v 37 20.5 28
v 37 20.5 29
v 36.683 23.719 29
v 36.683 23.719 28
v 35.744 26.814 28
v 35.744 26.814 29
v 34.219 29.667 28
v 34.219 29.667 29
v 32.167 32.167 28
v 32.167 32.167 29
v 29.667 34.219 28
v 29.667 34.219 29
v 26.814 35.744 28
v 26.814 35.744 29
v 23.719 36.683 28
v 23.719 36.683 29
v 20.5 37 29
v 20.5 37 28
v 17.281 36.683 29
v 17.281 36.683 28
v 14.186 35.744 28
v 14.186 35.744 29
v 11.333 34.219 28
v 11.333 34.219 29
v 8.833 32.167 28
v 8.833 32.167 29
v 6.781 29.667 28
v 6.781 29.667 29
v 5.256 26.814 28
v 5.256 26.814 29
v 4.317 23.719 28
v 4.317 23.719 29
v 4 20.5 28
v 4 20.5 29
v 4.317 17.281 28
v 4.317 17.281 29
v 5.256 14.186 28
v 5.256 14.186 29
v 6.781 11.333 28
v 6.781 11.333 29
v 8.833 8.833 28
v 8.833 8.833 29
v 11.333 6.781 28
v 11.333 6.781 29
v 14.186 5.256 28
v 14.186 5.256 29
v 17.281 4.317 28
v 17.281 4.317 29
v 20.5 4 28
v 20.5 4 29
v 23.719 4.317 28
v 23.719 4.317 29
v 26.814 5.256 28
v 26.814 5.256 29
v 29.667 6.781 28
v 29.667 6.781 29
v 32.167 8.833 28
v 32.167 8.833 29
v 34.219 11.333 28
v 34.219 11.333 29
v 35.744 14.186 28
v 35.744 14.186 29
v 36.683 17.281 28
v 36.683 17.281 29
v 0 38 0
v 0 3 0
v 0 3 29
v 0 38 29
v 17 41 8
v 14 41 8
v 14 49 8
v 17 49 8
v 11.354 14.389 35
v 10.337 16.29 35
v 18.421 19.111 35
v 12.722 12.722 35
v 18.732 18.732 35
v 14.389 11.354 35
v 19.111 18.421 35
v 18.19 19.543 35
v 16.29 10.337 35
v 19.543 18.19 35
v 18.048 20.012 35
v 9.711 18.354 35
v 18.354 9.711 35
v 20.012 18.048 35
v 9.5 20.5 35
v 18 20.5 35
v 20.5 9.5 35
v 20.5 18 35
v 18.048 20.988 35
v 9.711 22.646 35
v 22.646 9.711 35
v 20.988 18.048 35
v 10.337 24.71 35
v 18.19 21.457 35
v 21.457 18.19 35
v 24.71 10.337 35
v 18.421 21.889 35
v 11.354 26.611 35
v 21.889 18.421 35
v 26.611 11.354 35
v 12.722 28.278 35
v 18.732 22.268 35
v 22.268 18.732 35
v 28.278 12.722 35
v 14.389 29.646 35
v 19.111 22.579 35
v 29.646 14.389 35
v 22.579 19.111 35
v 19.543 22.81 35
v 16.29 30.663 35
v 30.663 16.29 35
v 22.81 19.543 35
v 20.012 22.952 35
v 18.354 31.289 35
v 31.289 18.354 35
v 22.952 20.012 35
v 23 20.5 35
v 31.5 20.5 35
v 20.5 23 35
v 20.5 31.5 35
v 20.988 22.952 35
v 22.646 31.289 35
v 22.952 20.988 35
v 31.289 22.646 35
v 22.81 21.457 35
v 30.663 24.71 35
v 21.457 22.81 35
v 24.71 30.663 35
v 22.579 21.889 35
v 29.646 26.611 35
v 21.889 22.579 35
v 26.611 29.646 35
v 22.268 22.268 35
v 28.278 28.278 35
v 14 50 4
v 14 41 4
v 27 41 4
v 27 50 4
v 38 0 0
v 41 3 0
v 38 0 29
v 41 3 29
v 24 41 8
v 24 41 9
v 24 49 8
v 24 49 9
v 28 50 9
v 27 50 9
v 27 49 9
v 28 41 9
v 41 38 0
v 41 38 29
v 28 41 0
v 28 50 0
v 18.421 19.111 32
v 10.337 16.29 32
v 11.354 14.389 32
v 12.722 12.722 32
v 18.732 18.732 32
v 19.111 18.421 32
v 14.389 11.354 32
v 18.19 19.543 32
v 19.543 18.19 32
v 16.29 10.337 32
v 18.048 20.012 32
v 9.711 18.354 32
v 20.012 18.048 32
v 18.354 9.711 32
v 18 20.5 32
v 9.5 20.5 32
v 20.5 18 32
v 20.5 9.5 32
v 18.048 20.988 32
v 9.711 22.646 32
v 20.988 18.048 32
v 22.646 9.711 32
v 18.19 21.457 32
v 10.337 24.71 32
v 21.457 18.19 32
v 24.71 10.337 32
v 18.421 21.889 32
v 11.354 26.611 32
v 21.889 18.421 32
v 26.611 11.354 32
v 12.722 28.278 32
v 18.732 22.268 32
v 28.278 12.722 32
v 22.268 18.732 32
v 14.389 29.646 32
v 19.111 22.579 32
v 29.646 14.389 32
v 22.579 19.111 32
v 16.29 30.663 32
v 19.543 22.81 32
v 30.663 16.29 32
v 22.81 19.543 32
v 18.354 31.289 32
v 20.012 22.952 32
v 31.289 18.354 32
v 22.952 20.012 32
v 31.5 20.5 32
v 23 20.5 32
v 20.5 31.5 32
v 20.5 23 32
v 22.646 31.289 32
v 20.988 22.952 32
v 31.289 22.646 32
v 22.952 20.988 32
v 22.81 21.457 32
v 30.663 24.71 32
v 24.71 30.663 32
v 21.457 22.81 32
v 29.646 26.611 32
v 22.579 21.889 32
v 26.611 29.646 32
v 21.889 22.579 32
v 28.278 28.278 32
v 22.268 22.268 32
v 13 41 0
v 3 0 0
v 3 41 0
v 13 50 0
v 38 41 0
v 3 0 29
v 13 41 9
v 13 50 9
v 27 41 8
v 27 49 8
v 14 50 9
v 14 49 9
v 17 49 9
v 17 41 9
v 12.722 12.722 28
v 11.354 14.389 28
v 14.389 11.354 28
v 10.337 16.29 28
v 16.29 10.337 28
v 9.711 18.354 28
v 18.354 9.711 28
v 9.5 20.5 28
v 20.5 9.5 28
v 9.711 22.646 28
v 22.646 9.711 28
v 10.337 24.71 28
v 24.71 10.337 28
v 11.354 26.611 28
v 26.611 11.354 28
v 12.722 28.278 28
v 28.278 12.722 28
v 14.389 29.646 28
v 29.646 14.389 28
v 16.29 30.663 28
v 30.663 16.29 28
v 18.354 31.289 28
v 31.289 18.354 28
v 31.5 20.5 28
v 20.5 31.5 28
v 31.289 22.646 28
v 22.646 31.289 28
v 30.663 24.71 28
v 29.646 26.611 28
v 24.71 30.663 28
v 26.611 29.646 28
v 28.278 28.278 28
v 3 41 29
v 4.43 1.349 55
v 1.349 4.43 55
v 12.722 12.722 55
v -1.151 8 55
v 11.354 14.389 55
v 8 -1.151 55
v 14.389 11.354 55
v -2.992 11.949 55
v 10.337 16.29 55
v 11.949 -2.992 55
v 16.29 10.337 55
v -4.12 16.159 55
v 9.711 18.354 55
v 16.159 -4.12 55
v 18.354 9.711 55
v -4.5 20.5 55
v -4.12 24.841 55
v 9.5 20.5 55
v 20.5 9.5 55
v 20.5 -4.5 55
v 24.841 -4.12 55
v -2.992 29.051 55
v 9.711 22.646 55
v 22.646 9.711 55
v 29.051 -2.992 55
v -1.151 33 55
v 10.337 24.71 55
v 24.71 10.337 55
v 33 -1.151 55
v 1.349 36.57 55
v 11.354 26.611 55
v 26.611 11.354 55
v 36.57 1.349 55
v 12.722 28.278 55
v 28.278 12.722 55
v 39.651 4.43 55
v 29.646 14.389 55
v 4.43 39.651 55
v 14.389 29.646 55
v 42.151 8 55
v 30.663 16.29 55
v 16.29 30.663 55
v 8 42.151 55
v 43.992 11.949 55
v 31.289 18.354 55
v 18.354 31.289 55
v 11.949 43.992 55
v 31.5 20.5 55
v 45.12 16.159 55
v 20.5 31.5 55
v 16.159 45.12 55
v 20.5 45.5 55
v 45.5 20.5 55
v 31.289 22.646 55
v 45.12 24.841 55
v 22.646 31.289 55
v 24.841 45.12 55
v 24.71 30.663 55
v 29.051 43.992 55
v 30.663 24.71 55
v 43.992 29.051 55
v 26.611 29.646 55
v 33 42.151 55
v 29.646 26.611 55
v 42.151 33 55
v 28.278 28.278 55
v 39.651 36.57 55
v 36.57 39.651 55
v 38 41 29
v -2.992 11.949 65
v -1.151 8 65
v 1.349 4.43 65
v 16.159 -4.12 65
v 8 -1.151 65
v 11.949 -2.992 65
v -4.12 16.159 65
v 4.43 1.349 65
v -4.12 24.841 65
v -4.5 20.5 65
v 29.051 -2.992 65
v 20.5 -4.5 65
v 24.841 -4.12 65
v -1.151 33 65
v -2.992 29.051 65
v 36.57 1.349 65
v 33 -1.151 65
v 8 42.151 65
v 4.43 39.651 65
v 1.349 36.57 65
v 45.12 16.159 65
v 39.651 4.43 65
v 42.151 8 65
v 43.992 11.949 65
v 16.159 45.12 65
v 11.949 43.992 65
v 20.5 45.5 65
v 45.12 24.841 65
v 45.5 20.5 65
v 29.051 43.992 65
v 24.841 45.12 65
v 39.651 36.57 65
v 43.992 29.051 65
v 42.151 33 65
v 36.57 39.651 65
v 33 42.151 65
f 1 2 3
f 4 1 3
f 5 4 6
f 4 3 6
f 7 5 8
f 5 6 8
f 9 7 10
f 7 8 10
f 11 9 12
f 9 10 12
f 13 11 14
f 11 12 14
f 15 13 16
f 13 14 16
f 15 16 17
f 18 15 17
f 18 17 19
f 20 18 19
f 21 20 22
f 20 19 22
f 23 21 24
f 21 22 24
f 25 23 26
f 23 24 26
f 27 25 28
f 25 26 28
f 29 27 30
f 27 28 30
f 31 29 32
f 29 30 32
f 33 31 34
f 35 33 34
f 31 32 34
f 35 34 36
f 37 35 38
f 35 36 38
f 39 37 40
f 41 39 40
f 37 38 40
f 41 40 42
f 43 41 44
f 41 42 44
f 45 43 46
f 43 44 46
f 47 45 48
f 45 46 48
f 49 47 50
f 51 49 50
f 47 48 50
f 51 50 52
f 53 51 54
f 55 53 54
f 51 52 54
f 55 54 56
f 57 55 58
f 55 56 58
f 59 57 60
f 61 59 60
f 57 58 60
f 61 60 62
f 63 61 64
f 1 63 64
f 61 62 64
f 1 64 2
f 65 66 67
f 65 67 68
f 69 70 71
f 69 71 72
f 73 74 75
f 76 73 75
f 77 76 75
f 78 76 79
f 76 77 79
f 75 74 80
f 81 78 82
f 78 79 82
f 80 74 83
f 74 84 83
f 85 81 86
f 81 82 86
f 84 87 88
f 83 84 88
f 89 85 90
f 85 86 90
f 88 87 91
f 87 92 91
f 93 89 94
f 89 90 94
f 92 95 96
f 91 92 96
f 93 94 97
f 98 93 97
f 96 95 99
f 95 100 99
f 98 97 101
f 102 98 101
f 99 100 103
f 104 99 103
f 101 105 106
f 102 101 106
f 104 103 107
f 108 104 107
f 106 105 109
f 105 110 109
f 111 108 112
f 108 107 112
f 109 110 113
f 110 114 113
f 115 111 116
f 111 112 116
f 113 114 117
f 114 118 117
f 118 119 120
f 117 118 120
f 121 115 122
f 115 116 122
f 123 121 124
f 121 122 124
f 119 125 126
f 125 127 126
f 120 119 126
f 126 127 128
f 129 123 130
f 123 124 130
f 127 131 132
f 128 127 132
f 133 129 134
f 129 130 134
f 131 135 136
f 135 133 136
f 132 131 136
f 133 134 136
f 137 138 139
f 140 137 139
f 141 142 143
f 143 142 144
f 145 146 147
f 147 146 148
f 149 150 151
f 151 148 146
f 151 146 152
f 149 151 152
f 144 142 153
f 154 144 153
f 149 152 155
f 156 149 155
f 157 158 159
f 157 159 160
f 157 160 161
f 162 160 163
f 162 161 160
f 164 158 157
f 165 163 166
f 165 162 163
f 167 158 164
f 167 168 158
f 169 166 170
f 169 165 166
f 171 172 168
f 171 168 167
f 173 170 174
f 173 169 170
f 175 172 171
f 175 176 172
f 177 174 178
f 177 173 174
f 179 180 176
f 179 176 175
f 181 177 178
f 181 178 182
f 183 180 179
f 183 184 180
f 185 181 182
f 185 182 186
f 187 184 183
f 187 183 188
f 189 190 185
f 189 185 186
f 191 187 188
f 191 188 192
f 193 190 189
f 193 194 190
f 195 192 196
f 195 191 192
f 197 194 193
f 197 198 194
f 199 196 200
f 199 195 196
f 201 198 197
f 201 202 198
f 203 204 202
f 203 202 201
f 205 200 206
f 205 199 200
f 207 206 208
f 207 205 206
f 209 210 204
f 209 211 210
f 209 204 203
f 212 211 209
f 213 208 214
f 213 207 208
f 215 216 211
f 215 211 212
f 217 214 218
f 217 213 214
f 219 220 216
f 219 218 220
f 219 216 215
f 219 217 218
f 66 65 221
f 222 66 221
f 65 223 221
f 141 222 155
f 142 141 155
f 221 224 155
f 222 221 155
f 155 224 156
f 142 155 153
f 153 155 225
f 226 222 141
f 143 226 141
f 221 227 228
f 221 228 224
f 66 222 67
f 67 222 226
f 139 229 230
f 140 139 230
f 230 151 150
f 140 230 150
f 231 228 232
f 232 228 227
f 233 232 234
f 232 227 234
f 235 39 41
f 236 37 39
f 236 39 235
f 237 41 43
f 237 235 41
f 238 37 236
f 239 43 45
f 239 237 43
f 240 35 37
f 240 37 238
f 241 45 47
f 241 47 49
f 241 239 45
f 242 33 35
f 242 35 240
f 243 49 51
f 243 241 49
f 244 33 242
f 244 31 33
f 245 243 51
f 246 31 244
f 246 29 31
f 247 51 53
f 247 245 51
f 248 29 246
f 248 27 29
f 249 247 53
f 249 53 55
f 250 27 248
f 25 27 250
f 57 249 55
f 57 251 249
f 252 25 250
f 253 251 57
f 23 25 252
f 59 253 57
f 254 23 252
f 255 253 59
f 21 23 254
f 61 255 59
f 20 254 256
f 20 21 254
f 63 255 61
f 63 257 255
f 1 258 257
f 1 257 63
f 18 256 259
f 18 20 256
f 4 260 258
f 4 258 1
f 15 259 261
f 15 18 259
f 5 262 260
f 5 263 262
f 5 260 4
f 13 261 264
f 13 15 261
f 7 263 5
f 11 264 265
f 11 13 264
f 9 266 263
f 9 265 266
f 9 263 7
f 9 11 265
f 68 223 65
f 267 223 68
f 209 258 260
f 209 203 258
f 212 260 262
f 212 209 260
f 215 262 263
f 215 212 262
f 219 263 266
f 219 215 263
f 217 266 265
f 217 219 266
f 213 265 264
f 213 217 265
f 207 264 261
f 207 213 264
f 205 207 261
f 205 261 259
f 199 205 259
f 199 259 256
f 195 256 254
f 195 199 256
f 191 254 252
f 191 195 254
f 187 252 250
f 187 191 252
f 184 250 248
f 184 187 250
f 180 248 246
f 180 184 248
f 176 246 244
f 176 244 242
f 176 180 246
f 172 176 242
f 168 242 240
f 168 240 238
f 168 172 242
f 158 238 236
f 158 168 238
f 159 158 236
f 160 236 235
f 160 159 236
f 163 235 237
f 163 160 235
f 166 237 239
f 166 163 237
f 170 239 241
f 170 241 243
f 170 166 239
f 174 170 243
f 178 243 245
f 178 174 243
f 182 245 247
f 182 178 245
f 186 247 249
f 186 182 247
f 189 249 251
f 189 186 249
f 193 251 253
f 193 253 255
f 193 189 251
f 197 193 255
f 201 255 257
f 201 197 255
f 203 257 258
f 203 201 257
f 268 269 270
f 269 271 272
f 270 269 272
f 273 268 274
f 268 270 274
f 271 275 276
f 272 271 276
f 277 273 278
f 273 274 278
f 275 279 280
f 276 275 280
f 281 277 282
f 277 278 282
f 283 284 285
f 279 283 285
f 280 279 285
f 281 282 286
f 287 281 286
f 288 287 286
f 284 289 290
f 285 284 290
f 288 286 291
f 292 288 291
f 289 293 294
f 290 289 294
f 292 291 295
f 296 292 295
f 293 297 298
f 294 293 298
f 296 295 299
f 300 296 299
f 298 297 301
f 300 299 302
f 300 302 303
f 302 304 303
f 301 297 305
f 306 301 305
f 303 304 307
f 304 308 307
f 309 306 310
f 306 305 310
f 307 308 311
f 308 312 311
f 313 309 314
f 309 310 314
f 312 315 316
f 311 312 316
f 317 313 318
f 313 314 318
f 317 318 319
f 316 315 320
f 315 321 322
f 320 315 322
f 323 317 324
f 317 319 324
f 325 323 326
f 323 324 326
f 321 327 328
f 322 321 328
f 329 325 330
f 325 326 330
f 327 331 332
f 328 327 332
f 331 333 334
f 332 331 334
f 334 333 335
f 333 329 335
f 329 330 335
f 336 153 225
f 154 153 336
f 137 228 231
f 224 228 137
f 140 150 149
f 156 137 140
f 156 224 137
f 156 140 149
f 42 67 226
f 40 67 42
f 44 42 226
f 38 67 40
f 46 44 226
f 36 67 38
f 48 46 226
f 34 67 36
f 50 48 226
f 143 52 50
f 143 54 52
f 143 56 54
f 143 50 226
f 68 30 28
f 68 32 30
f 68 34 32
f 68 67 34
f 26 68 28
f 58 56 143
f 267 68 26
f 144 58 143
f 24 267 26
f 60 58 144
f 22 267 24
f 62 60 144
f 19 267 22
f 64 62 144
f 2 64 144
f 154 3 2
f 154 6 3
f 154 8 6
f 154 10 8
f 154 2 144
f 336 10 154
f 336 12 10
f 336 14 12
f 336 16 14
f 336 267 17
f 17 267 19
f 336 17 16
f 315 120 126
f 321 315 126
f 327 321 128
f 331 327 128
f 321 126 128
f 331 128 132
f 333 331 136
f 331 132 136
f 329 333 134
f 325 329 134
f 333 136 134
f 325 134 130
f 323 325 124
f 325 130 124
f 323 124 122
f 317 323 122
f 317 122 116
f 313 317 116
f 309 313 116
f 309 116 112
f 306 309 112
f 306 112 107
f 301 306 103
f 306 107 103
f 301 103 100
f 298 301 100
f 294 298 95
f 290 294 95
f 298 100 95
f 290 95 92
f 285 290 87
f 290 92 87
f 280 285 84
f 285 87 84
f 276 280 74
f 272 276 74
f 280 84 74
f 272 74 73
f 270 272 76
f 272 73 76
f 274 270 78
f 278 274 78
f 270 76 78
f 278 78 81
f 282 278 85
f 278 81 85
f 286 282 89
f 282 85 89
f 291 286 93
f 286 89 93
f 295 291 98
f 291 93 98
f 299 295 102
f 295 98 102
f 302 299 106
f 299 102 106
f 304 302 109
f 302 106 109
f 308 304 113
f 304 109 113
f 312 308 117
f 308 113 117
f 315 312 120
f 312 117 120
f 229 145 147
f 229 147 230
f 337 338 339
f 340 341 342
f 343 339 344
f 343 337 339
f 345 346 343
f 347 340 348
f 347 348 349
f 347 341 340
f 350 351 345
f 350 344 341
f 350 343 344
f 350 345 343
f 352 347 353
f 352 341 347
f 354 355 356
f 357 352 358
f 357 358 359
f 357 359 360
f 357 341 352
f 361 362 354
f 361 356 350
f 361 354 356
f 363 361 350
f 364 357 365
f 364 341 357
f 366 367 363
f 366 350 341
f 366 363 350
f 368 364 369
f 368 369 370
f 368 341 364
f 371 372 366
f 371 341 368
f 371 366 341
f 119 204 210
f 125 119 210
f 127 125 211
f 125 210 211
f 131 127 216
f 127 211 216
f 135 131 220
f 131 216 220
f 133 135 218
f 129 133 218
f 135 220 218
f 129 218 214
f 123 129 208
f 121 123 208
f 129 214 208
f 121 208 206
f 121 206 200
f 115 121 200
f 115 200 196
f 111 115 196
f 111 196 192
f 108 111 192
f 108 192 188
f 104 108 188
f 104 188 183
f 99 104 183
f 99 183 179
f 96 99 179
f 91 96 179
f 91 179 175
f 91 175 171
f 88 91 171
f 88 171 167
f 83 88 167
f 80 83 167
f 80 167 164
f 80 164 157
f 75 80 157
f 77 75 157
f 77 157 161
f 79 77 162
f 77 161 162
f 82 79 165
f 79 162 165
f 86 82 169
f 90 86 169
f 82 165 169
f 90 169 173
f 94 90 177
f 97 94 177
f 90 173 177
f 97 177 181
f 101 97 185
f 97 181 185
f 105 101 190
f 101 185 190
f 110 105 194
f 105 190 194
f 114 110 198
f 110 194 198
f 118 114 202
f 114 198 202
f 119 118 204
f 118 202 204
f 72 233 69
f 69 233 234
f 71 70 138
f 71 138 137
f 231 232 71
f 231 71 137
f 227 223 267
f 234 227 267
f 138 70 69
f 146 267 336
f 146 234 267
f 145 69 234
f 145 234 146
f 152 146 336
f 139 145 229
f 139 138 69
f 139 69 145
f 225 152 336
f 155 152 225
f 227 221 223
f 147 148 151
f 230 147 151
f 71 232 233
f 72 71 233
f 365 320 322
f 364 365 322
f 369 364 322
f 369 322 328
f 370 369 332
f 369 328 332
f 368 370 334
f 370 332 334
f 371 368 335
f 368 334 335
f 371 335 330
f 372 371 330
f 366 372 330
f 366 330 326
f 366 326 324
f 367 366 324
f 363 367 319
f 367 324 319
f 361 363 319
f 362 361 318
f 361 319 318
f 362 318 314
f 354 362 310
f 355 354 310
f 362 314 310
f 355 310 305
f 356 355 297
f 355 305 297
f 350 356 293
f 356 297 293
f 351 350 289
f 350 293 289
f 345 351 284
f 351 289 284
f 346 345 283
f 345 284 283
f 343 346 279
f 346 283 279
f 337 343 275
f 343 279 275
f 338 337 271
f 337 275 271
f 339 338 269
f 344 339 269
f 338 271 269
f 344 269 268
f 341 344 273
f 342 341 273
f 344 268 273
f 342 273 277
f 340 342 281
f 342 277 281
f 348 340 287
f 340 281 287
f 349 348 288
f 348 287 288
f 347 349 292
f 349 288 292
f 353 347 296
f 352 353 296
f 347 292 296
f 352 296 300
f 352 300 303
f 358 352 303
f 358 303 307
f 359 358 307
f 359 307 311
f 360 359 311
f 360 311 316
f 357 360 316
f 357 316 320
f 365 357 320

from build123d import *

# Parameters (mm, degrees)
ESQUISSE1_W             = 41
ESQUISSE1_H             = 41
BOSS_EXTRU_1_DEPTH      = 29
ESQUISSE2_R             = 16.5
ESQUISSE2_R_2           = 11
ENL_V_MAT_EXTRU_1_DEPTH = 1
BOSS_EXTRU_2_START      = 3
ESQUISSE2_3_R           = 11
ESQUISSE2_3_R_2         = 2.5
BOSS_EXTRU_2_DEPTH      = 3
BOSS_EXTRU_3_START      = 6
ESQUISSE2_4_R           = 2.5
BOSS_EXTRU_3_DEPTH      = 6
BOSS_EXTRU_4_START      = 20
ESQUISSE7_R             = 11
BOSS_EXTRU_4_DEPTH      = 20
ESQUISSE9_R             = 25
BOSS_EXTRU_5_DEPTH      = 10
CHANFREIN1_SIZE         = 3
ESQUISSE10_W            = 15
ESQUISSE10_H            = 9
ESQUISSE10_W_2          = 13
ESQUISSE10_H_2          = 4
BOSS_EXTRU_6_DEPTH      = 9
ENL_V_MAT_EXTRU_3_DEPTH = 2


with BuildPart() as part:
    # Esquisse1 → Boss.-Extru.1 (new body)
    with BuildSketch(Plane.XY):
        with Locations((20.5, 20.5)):
            Rectangle(ESQUISSE1_W, ESQUISSE1_H)
    extrude(amount=BOSS_EXTRU_1_DEPTH)

    # Esquisse2 → Enlèv. mat.-Extru.1 (cut)
    with BuildSketch(Plane.XY.offset(29)):
        with Locations((20.5, 20.5)):
            Circle(ESQUISSE2_R)
        with Locations((20.5, 20.5)):
            Circle(ESQUISSE2_R_2, mode=Mode.SUBTRACT)
    extrude(amount=-ENL_V_MAT_EXTRU_1_DEPTH, mode=Mode.SUBTRACT)

    # Esquisse2<3> → Boss.-Extru.2 (add)
    with BuildSketch(Plane.XY.offset(29).offset(BOSS_EXTRU_2_START)):
        with Locations((20.5, 20.5)):
            Circle(ESQUISSE2_3_R)
        with Locations((20.5, 20.5)):
            Circle(ESQUISSE2_3_R_2, mode=Mode.SUBTRACT)
    extrude(amount=-BOSS_EXTRU_2_DEPTH)

    # Esquisse2<4> → Boss.-Extru.3 (add)
    with BuildSketch(Plane.XY.offset(29).offset(BOSS_EXTRU_3_START)):
        with Locations((20.5, 20.5)):
            Circle(ESQUISSE2_4_R)
    extrude(amount=-BOSS_EXTRU_3_DEPTH)

    # Esquisse7 → Boss.-Extru.4 (add)
    with BuildSketch(Plane.XY.offset(35).offset(BOSS_EXTRU_4_START)):
        with Locations((20.5, 20.5)):
            Circle(ESQUISSE7_R)
    extrude(amount=-BOSS_EXTRU_4_DEPTH)

    # Esquisse9 → Boss.-Extru.5 (add)
    with BuildSketch(Plane.XY.offset(55)):
        with Locations((20.5, 20.5)):
            Circle(ESQUISSE9_R)
    extrude(amount=BOSS_EXTRU_5_DEPTH)

    # Chanfrein1
    chanfrein1_edges = [part.edges().sort_by_distance(p)[0] for p in [
        (41, 41, 14.5),
        (41, 0, 14.5),
        (0, 0, 14.5),
        (0, 41, 14.5),
    ]]
    chamfer(chanfrein1_edges, length=CHANFREIN1_SIZE)

    # Esquisse10 → Boss.-Extru.6 (add)
    with BuildSketch(Plane(origin=(0, 41, 0), x_dir=(1, 0, 0), z_dir=(0, 1, 0))):
        with Locations((20.5, -4.5)):
            Rectangle(ESQUISSE10_W, ESQUISSE10_H)
        with Locations((20.5, -6)):
            Rectangle(ESQUISSE10_W_2, ESQUISSE10_H_2, mode=Mode.SUBTRACT)
    extrude(amount=BOSS_EXTRU_6_DEPTH)

    # Esquisse11 → Enlèv. mat.-Extru.3 (cut)
    with BuildSketch(Plane.XY.offset(9)):
        Polygon((17, 41), (24, 41), (24, 49), (27, 49), (27, 50), (14, 50), (14, 49), (17, 49), align=None)
    extrude(amount=-ENL_V_MAT_EXTRU_3_DEPTH, mode=Mode.SUBTRACT)


solid = part.part
